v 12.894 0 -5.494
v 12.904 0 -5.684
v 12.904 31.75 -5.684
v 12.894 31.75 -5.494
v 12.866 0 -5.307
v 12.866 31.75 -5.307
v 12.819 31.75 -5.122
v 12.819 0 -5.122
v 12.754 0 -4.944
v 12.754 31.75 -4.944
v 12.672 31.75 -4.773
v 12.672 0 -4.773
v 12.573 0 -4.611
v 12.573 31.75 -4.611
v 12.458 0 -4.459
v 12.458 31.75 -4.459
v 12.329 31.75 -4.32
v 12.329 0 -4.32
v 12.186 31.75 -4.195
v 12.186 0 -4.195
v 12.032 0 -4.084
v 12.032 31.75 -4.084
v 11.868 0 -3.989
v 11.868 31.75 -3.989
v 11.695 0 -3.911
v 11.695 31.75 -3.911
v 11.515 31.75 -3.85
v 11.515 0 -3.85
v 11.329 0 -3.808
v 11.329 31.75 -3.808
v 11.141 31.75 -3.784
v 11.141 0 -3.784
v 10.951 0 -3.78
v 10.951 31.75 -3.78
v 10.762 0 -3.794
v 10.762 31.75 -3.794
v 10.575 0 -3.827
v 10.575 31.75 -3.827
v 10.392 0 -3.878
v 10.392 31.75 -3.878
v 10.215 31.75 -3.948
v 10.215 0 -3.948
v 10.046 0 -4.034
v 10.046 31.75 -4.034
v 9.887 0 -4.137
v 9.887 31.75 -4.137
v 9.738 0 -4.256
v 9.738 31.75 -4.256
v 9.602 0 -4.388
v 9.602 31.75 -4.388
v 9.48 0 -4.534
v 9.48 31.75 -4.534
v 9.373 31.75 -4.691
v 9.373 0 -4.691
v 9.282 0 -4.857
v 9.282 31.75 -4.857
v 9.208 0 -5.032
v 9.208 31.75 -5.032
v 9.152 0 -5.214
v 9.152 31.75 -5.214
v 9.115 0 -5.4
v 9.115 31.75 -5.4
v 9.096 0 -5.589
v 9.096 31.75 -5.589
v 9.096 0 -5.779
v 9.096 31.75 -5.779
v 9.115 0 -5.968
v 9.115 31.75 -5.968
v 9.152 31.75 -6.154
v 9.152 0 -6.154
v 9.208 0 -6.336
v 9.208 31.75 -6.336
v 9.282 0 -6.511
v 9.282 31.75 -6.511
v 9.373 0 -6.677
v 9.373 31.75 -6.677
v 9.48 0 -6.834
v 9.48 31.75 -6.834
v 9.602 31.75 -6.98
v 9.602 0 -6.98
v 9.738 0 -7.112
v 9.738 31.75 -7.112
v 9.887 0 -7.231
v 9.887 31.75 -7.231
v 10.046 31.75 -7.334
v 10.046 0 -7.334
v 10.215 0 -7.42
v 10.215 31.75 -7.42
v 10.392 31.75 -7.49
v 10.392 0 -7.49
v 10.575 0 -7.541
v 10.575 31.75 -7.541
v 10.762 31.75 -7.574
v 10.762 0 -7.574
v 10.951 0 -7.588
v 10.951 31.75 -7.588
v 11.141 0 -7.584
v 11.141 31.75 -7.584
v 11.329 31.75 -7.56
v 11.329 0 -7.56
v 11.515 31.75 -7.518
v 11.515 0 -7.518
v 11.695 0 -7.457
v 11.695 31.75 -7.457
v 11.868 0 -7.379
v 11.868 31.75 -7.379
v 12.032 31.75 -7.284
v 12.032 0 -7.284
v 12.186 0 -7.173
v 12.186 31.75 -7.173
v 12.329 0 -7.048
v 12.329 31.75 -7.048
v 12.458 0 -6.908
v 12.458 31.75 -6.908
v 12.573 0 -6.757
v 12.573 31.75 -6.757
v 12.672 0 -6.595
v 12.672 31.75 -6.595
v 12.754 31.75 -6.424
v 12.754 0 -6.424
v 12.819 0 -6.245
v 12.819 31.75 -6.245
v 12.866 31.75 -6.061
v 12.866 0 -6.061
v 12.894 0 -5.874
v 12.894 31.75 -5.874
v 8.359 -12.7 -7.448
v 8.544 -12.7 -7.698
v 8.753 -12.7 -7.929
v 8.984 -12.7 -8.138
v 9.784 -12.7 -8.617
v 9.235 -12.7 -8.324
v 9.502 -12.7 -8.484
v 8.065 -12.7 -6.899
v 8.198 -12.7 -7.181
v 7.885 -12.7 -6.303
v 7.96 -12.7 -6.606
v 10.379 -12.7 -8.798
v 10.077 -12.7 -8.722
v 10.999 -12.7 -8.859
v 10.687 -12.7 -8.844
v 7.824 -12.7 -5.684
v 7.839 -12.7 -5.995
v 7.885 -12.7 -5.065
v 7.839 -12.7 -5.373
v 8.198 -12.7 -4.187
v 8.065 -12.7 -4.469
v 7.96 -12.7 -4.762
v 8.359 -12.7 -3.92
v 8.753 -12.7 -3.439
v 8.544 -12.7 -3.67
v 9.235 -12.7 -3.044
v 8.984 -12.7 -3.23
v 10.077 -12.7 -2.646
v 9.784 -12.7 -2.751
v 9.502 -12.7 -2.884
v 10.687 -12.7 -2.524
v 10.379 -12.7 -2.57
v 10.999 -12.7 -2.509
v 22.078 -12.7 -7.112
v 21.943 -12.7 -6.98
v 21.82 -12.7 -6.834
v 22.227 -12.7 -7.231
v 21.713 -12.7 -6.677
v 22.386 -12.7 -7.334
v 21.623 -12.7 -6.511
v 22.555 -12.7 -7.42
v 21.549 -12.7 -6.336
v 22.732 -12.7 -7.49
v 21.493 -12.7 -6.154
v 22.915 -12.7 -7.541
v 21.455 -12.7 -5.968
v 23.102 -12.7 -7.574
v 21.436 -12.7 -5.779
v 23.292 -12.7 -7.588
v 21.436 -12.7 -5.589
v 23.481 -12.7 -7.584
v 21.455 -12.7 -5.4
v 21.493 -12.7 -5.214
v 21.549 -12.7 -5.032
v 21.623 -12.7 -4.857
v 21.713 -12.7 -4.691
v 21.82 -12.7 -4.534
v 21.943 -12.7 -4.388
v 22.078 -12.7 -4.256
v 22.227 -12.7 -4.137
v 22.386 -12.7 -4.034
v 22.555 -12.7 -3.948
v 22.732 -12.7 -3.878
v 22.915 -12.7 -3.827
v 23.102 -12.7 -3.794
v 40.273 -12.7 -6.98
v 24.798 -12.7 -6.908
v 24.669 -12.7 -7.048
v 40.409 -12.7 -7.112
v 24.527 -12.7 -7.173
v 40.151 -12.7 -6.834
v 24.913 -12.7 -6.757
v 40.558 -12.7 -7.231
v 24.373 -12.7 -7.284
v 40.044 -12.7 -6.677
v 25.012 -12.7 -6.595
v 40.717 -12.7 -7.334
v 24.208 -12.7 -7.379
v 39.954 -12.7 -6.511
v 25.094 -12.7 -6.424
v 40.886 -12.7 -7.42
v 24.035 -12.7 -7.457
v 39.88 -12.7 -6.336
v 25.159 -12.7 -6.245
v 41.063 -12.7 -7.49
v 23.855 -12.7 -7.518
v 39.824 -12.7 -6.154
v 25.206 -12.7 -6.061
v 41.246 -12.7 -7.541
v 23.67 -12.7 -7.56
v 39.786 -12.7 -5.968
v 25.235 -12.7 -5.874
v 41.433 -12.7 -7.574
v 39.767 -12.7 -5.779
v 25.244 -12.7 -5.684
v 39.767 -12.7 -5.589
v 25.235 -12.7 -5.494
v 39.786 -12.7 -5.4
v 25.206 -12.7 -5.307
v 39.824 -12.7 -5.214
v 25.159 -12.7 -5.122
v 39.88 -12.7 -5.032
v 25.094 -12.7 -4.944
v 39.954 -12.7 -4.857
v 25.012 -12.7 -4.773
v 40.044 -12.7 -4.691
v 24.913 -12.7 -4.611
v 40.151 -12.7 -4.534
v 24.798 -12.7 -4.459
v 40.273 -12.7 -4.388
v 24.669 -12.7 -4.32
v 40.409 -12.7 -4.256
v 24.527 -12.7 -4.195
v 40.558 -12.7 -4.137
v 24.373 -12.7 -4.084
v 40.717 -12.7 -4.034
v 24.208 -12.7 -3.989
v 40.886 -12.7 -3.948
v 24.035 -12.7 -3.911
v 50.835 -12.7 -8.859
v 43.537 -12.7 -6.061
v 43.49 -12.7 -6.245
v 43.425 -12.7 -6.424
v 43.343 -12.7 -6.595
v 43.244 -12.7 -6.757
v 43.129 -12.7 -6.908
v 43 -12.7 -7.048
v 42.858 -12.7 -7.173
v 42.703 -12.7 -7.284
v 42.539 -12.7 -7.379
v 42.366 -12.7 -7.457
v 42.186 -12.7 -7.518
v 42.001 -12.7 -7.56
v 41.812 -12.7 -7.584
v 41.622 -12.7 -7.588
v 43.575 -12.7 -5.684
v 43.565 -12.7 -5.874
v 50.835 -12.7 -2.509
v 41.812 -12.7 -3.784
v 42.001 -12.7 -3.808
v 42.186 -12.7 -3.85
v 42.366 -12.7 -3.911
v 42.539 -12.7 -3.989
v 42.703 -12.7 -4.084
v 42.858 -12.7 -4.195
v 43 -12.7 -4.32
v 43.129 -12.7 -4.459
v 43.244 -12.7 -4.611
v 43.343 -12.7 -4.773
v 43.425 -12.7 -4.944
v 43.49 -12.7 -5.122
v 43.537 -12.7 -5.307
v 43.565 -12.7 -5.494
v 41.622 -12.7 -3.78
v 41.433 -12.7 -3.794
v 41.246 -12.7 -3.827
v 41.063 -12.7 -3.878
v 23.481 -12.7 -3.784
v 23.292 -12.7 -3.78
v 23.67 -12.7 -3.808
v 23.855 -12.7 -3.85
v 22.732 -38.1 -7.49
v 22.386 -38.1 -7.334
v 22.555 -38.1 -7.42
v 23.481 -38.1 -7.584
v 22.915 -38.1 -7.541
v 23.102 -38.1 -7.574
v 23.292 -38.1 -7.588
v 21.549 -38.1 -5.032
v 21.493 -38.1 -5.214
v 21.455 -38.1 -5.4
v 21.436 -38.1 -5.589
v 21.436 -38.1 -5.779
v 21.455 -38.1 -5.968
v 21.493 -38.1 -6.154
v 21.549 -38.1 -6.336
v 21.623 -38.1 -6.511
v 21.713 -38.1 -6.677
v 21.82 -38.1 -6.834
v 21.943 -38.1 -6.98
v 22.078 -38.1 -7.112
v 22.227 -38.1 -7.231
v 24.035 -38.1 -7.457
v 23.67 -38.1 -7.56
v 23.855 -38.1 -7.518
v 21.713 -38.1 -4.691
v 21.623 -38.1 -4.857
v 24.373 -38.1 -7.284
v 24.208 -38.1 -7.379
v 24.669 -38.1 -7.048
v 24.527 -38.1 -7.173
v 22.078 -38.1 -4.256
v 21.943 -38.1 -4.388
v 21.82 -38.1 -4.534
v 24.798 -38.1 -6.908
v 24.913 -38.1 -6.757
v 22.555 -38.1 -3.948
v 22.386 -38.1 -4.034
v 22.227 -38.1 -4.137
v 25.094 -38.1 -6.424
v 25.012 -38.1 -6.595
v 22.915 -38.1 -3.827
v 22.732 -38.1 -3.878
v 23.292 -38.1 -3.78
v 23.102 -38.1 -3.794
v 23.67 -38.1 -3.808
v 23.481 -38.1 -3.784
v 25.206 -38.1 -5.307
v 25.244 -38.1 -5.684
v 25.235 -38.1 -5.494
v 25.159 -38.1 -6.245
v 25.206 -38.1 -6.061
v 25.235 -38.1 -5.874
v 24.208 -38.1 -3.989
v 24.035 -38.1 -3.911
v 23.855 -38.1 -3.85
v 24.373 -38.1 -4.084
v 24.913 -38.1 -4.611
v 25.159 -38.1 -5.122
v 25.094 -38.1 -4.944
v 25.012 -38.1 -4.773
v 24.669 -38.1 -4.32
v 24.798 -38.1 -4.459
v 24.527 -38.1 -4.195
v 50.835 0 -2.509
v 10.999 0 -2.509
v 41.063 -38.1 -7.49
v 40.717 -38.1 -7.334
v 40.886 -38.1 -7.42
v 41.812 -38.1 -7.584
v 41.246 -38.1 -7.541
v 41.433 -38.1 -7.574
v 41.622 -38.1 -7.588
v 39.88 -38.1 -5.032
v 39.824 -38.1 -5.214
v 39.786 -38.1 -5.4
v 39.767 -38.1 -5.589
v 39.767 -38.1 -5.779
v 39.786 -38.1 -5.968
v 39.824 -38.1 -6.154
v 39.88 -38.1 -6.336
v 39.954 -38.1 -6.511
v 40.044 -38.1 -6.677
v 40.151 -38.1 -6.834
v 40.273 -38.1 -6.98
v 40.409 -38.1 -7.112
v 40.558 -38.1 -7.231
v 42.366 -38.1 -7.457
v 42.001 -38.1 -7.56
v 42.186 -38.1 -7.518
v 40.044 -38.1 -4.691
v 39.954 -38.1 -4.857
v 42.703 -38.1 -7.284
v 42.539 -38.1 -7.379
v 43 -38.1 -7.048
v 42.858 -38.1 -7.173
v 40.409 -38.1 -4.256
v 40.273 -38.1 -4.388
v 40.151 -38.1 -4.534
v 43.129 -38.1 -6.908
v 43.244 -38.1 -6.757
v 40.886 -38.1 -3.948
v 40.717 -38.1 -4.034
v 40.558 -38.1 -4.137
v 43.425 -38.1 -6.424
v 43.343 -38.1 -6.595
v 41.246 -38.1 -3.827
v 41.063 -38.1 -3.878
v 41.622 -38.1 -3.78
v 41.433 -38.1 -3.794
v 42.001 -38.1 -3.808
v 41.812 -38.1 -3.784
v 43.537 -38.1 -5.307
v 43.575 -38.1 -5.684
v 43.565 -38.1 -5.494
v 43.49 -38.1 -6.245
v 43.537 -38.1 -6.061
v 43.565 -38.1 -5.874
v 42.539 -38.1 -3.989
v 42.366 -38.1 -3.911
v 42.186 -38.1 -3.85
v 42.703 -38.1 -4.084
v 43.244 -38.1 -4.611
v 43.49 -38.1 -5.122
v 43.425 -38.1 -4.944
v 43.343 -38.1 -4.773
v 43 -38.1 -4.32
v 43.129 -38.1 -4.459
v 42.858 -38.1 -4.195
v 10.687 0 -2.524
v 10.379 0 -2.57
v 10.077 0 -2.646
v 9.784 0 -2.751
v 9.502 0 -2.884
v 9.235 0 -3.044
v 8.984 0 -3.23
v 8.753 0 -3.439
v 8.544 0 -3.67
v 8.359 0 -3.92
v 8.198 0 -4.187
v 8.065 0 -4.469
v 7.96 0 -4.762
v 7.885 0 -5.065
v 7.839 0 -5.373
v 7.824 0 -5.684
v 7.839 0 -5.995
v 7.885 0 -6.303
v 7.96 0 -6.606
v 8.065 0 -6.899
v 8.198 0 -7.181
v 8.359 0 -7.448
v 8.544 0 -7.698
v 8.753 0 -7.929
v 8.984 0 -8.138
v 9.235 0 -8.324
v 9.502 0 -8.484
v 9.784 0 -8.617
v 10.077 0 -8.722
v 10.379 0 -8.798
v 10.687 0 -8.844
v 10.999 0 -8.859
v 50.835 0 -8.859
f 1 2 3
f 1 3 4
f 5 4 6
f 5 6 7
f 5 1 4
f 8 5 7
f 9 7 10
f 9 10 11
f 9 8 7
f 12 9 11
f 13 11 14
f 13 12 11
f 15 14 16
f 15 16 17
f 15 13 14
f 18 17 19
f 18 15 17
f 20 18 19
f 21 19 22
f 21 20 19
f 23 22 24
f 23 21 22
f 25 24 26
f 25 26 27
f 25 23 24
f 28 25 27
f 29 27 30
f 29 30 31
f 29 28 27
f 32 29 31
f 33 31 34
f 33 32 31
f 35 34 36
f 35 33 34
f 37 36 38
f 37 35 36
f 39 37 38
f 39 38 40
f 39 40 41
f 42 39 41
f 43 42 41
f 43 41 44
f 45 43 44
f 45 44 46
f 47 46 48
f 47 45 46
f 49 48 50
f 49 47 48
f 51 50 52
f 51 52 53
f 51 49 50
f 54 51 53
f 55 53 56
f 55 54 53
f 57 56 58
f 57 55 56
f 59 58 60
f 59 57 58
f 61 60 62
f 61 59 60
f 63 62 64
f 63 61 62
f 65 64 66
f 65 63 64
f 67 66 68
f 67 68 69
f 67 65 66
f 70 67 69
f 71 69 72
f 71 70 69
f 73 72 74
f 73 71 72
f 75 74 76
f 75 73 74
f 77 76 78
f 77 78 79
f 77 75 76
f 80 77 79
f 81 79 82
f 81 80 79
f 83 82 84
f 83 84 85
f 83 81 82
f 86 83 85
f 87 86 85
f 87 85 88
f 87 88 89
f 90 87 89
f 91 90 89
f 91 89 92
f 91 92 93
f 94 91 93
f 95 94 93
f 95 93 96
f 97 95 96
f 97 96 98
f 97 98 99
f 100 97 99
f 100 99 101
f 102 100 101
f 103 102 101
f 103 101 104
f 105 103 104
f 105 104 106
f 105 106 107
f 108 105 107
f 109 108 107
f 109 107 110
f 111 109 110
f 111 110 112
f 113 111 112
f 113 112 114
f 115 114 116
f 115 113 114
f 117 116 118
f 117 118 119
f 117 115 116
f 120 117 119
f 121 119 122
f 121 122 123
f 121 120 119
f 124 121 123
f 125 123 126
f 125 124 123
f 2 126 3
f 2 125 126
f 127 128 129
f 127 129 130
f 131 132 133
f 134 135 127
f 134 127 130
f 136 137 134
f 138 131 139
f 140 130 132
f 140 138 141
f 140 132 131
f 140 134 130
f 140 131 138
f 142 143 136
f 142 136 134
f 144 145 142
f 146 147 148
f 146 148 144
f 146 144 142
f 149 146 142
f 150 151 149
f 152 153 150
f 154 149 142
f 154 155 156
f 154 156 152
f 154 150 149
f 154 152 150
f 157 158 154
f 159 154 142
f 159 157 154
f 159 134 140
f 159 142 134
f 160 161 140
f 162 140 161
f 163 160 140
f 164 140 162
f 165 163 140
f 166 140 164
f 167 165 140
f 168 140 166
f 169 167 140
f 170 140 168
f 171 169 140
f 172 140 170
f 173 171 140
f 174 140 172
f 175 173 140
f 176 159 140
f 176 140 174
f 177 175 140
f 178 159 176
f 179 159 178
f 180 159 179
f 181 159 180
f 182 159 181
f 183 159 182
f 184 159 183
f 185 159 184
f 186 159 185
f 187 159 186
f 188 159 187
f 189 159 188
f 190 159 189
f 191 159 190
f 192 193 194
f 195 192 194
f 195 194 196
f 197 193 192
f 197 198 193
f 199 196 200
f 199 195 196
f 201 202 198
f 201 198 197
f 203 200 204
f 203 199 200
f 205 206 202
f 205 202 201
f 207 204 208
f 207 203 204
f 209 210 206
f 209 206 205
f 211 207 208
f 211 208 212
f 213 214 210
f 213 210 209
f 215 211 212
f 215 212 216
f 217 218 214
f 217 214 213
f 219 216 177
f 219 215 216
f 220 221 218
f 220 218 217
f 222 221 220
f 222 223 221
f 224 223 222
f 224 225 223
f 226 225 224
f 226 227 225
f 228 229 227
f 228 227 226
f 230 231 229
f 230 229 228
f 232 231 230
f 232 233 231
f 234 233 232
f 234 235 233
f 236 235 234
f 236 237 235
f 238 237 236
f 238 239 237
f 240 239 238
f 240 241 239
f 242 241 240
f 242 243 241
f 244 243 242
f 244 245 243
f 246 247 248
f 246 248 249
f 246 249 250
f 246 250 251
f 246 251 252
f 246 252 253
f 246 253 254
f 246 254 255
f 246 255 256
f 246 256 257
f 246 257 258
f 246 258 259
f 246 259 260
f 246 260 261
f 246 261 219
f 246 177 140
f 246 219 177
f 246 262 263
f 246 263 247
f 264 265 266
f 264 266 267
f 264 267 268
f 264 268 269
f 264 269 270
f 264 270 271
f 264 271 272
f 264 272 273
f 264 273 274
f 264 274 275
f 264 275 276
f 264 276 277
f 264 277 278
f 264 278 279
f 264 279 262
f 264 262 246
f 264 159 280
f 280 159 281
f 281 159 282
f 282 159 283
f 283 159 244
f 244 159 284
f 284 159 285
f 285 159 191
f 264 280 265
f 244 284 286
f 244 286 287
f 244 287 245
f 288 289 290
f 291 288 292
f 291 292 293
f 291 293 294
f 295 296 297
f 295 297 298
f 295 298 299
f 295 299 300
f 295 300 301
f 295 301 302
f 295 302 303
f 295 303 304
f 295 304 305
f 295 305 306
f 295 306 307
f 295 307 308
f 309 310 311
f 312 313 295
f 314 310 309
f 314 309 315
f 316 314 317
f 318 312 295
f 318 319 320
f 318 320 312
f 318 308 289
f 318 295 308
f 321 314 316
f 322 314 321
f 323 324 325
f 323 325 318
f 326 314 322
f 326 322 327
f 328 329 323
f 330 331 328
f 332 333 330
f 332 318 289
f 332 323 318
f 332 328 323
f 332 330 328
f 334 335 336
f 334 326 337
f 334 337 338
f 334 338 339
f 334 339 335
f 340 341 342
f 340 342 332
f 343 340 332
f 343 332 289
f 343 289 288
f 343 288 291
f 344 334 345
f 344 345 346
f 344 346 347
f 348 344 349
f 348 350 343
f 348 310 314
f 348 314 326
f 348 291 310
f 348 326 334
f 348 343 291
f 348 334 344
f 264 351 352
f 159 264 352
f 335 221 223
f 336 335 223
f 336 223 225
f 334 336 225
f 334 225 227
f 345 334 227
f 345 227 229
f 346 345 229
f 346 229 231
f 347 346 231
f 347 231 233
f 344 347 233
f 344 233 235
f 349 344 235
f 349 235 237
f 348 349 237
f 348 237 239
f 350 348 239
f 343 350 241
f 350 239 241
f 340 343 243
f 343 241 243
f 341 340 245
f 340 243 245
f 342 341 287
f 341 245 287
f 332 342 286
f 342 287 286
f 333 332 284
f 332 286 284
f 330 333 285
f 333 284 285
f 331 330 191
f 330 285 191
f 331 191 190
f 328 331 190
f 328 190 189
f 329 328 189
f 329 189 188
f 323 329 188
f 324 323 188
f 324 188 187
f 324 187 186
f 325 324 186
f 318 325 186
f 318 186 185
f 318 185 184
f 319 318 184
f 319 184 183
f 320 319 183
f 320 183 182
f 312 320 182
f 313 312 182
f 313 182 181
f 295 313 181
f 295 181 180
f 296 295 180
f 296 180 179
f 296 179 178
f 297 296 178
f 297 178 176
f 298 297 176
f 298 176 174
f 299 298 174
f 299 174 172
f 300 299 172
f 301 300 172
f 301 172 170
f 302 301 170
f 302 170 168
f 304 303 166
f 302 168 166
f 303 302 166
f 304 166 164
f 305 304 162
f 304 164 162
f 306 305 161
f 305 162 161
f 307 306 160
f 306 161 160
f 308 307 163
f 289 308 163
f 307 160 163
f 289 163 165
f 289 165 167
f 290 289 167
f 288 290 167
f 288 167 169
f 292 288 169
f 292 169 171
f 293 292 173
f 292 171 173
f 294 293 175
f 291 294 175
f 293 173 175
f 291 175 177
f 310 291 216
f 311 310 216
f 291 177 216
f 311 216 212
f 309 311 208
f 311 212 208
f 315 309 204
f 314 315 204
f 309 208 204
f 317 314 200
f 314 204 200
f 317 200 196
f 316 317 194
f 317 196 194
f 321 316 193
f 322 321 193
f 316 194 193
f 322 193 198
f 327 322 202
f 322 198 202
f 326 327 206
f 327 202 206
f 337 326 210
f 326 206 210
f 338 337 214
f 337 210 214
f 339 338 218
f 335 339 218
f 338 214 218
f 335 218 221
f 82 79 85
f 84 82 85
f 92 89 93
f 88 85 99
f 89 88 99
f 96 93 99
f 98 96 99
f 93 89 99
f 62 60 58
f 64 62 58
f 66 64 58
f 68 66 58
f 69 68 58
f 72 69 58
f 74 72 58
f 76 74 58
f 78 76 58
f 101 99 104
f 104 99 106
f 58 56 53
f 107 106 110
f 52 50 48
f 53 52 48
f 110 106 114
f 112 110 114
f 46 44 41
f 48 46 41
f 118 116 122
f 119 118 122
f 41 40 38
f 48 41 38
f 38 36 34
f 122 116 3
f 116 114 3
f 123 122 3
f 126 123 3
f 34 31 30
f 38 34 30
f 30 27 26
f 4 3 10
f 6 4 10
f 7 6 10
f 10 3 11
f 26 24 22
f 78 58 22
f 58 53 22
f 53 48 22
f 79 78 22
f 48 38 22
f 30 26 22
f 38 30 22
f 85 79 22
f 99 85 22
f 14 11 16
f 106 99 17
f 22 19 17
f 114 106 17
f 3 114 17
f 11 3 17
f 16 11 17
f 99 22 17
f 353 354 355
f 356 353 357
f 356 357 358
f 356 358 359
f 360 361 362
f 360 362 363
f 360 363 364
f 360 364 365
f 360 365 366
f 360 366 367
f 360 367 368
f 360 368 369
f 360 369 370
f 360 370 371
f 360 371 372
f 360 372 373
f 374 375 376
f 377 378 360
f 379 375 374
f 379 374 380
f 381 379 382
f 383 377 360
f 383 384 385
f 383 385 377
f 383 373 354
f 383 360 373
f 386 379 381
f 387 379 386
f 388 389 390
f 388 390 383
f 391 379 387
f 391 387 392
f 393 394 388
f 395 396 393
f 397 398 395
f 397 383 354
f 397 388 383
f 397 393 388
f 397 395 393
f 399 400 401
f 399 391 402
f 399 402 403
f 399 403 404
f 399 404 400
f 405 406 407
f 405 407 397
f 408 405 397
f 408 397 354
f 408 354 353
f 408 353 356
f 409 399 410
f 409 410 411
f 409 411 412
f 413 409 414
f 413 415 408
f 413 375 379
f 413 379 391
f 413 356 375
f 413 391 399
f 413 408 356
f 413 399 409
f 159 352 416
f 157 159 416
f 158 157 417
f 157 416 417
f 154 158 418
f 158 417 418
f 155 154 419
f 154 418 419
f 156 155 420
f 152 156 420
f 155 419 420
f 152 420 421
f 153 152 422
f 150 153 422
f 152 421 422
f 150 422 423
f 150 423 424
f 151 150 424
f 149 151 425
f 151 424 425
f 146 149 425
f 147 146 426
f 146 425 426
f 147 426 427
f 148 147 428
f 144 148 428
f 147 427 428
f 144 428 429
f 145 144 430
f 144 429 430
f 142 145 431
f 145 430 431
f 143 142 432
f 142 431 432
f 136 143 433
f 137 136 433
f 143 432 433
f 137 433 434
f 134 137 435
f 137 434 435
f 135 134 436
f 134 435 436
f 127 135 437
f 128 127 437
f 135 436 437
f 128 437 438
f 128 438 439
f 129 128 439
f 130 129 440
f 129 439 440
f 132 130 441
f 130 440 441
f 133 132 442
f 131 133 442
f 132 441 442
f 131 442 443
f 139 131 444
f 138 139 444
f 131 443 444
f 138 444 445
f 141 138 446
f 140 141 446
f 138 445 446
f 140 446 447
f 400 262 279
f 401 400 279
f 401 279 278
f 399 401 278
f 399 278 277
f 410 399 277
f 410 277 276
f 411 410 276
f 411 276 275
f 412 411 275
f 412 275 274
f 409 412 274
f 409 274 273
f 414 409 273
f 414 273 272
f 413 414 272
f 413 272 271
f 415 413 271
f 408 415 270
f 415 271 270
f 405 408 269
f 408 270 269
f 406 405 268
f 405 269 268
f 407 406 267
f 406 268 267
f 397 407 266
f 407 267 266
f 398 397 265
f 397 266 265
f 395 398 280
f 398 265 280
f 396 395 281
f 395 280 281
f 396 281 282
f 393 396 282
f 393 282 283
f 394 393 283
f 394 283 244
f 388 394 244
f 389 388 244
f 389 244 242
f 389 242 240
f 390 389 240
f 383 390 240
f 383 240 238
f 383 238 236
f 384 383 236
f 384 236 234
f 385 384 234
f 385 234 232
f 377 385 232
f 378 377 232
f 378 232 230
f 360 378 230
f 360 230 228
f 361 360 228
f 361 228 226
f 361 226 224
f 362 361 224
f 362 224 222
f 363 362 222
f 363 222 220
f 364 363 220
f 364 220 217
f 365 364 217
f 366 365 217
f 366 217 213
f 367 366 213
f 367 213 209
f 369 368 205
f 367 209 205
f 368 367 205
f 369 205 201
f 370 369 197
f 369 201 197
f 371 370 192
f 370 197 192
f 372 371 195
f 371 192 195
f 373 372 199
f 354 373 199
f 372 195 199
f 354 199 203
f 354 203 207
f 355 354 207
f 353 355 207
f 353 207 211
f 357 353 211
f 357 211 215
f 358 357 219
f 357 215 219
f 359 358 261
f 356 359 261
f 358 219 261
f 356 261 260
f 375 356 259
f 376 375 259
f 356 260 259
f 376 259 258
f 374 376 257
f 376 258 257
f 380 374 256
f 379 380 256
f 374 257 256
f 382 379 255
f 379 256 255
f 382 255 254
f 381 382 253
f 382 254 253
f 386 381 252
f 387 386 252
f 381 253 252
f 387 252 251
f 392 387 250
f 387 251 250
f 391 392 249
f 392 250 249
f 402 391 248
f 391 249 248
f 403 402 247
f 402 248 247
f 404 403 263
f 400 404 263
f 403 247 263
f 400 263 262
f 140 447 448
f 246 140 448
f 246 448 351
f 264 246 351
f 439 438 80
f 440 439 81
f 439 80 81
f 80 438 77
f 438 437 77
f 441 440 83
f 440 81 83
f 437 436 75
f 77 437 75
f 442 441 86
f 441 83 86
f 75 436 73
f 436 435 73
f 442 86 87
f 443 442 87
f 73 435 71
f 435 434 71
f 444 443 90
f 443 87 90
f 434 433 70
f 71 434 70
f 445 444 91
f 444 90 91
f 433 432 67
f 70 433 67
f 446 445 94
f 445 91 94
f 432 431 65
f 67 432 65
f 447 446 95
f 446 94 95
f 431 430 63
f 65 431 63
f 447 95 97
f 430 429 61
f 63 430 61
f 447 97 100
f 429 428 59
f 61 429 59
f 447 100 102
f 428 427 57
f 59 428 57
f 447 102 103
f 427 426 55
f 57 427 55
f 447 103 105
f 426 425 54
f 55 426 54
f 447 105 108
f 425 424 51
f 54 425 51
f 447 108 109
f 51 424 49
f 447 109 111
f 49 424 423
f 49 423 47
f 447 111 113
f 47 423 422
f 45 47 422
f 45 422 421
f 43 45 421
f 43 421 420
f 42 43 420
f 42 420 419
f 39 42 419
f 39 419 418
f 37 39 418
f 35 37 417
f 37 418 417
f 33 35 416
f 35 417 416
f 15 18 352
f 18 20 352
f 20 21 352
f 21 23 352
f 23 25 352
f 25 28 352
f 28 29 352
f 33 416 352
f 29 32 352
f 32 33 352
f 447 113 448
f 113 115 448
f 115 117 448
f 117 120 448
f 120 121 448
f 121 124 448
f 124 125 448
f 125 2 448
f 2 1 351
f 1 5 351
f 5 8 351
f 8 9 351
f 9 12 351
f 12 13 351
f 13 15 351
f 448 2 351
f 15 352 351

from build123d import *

# Parameters (mm, degrees)
F0_W     = 2.832651
F0_H     = 6.35
F0_R     = 1.905
F1_DEPTH = 12.7
F2_DEPTH = 38.1
F3_DEPTH = 31.75


with BuildPart() as f1:
    # F0 (on Front) → F1 (new body)
    with BuildSketch(Plane.XZ):
        with Locations((49.418978, -5.683978)):
            Rectangle(F0_W, F0_H)
        Polygon((14.173562, -8.858978), (48.002653, -8.858978), (48.002653, -2.508978), (14.173562, -2.508978), (14.173562, -5.683978), align=None)
        with Locations((41.669869, -5.683978)):
            Circle(F0_R, mode=Mode.SUBTRACT)
        with Locations((23.338998, -5.683978)):
            Circle(F0_R, mode=Mode.SUBTRACT)
        with BuildLine():
            Line((10.998562, -8.858978), (14.173562, -8.858978))
            Line((14.173562, -8.858978), (14.173562, -5.683978))
            ThreePointArc((14.173562, -5.683978), (13.243626, -7.929042), (10.998562, -8.858978))
        make_face()
        with BuildLine():
            Line((14.173562, -5.683978), (14.173562, -2.508978))
            Line((14.173562, -2.508978), (10.998562, -2.508978))
            ThreePointArc((10.998562, -2.508978), (13.243626, -3.438914), (14.173562, -5.683978))
        make_face()
        with BuildLine():
            ThreePointArc((10.998562, -8.858978), (13.243626, -7.929042), (14.173562, -5.683978))
            ThreePointArc((14.173562, -5.683978), (13.243626, -3.438914), (10.998562, -2.508978))
            ThreePointArc((10.998562, -2.508978), (7.823562, -5.683978), (10.998562, -8.858978))
        make_face()
        with Locations((10.998562, -5.683978)):
            Circle(F0_R, mode=Mode.SUBTRACT)
        with Locations((23.338998, -5.683978)):
            Circle(F0_R)
        with Locations((41.669869, -5.683978)):
            Circle(F0_R)
        with Locations((10.998562, -5.683978)):
            Circle(F0_R)
    extrude(amount=F1_DEPTH)

    # F0 (on Front) → F2 (join)
    with BuildSketch(Plane.XZ):
        with Locations((23.338998, -5.683978)):
            Circle(F0_R)
        with Locations((41.669869, -5.683978)):
            Circle(F0_R)
    extrude(amount=F2_DEPTH)

    # F0 (on Front) → F3 (join)
    with BuildSketch(Plane.XZ):
        with Locations((10.998562, -5.683978)):
            Circle(F0_R)
    extrude(amount=-F3_DEPTH)


solid = f1.part
